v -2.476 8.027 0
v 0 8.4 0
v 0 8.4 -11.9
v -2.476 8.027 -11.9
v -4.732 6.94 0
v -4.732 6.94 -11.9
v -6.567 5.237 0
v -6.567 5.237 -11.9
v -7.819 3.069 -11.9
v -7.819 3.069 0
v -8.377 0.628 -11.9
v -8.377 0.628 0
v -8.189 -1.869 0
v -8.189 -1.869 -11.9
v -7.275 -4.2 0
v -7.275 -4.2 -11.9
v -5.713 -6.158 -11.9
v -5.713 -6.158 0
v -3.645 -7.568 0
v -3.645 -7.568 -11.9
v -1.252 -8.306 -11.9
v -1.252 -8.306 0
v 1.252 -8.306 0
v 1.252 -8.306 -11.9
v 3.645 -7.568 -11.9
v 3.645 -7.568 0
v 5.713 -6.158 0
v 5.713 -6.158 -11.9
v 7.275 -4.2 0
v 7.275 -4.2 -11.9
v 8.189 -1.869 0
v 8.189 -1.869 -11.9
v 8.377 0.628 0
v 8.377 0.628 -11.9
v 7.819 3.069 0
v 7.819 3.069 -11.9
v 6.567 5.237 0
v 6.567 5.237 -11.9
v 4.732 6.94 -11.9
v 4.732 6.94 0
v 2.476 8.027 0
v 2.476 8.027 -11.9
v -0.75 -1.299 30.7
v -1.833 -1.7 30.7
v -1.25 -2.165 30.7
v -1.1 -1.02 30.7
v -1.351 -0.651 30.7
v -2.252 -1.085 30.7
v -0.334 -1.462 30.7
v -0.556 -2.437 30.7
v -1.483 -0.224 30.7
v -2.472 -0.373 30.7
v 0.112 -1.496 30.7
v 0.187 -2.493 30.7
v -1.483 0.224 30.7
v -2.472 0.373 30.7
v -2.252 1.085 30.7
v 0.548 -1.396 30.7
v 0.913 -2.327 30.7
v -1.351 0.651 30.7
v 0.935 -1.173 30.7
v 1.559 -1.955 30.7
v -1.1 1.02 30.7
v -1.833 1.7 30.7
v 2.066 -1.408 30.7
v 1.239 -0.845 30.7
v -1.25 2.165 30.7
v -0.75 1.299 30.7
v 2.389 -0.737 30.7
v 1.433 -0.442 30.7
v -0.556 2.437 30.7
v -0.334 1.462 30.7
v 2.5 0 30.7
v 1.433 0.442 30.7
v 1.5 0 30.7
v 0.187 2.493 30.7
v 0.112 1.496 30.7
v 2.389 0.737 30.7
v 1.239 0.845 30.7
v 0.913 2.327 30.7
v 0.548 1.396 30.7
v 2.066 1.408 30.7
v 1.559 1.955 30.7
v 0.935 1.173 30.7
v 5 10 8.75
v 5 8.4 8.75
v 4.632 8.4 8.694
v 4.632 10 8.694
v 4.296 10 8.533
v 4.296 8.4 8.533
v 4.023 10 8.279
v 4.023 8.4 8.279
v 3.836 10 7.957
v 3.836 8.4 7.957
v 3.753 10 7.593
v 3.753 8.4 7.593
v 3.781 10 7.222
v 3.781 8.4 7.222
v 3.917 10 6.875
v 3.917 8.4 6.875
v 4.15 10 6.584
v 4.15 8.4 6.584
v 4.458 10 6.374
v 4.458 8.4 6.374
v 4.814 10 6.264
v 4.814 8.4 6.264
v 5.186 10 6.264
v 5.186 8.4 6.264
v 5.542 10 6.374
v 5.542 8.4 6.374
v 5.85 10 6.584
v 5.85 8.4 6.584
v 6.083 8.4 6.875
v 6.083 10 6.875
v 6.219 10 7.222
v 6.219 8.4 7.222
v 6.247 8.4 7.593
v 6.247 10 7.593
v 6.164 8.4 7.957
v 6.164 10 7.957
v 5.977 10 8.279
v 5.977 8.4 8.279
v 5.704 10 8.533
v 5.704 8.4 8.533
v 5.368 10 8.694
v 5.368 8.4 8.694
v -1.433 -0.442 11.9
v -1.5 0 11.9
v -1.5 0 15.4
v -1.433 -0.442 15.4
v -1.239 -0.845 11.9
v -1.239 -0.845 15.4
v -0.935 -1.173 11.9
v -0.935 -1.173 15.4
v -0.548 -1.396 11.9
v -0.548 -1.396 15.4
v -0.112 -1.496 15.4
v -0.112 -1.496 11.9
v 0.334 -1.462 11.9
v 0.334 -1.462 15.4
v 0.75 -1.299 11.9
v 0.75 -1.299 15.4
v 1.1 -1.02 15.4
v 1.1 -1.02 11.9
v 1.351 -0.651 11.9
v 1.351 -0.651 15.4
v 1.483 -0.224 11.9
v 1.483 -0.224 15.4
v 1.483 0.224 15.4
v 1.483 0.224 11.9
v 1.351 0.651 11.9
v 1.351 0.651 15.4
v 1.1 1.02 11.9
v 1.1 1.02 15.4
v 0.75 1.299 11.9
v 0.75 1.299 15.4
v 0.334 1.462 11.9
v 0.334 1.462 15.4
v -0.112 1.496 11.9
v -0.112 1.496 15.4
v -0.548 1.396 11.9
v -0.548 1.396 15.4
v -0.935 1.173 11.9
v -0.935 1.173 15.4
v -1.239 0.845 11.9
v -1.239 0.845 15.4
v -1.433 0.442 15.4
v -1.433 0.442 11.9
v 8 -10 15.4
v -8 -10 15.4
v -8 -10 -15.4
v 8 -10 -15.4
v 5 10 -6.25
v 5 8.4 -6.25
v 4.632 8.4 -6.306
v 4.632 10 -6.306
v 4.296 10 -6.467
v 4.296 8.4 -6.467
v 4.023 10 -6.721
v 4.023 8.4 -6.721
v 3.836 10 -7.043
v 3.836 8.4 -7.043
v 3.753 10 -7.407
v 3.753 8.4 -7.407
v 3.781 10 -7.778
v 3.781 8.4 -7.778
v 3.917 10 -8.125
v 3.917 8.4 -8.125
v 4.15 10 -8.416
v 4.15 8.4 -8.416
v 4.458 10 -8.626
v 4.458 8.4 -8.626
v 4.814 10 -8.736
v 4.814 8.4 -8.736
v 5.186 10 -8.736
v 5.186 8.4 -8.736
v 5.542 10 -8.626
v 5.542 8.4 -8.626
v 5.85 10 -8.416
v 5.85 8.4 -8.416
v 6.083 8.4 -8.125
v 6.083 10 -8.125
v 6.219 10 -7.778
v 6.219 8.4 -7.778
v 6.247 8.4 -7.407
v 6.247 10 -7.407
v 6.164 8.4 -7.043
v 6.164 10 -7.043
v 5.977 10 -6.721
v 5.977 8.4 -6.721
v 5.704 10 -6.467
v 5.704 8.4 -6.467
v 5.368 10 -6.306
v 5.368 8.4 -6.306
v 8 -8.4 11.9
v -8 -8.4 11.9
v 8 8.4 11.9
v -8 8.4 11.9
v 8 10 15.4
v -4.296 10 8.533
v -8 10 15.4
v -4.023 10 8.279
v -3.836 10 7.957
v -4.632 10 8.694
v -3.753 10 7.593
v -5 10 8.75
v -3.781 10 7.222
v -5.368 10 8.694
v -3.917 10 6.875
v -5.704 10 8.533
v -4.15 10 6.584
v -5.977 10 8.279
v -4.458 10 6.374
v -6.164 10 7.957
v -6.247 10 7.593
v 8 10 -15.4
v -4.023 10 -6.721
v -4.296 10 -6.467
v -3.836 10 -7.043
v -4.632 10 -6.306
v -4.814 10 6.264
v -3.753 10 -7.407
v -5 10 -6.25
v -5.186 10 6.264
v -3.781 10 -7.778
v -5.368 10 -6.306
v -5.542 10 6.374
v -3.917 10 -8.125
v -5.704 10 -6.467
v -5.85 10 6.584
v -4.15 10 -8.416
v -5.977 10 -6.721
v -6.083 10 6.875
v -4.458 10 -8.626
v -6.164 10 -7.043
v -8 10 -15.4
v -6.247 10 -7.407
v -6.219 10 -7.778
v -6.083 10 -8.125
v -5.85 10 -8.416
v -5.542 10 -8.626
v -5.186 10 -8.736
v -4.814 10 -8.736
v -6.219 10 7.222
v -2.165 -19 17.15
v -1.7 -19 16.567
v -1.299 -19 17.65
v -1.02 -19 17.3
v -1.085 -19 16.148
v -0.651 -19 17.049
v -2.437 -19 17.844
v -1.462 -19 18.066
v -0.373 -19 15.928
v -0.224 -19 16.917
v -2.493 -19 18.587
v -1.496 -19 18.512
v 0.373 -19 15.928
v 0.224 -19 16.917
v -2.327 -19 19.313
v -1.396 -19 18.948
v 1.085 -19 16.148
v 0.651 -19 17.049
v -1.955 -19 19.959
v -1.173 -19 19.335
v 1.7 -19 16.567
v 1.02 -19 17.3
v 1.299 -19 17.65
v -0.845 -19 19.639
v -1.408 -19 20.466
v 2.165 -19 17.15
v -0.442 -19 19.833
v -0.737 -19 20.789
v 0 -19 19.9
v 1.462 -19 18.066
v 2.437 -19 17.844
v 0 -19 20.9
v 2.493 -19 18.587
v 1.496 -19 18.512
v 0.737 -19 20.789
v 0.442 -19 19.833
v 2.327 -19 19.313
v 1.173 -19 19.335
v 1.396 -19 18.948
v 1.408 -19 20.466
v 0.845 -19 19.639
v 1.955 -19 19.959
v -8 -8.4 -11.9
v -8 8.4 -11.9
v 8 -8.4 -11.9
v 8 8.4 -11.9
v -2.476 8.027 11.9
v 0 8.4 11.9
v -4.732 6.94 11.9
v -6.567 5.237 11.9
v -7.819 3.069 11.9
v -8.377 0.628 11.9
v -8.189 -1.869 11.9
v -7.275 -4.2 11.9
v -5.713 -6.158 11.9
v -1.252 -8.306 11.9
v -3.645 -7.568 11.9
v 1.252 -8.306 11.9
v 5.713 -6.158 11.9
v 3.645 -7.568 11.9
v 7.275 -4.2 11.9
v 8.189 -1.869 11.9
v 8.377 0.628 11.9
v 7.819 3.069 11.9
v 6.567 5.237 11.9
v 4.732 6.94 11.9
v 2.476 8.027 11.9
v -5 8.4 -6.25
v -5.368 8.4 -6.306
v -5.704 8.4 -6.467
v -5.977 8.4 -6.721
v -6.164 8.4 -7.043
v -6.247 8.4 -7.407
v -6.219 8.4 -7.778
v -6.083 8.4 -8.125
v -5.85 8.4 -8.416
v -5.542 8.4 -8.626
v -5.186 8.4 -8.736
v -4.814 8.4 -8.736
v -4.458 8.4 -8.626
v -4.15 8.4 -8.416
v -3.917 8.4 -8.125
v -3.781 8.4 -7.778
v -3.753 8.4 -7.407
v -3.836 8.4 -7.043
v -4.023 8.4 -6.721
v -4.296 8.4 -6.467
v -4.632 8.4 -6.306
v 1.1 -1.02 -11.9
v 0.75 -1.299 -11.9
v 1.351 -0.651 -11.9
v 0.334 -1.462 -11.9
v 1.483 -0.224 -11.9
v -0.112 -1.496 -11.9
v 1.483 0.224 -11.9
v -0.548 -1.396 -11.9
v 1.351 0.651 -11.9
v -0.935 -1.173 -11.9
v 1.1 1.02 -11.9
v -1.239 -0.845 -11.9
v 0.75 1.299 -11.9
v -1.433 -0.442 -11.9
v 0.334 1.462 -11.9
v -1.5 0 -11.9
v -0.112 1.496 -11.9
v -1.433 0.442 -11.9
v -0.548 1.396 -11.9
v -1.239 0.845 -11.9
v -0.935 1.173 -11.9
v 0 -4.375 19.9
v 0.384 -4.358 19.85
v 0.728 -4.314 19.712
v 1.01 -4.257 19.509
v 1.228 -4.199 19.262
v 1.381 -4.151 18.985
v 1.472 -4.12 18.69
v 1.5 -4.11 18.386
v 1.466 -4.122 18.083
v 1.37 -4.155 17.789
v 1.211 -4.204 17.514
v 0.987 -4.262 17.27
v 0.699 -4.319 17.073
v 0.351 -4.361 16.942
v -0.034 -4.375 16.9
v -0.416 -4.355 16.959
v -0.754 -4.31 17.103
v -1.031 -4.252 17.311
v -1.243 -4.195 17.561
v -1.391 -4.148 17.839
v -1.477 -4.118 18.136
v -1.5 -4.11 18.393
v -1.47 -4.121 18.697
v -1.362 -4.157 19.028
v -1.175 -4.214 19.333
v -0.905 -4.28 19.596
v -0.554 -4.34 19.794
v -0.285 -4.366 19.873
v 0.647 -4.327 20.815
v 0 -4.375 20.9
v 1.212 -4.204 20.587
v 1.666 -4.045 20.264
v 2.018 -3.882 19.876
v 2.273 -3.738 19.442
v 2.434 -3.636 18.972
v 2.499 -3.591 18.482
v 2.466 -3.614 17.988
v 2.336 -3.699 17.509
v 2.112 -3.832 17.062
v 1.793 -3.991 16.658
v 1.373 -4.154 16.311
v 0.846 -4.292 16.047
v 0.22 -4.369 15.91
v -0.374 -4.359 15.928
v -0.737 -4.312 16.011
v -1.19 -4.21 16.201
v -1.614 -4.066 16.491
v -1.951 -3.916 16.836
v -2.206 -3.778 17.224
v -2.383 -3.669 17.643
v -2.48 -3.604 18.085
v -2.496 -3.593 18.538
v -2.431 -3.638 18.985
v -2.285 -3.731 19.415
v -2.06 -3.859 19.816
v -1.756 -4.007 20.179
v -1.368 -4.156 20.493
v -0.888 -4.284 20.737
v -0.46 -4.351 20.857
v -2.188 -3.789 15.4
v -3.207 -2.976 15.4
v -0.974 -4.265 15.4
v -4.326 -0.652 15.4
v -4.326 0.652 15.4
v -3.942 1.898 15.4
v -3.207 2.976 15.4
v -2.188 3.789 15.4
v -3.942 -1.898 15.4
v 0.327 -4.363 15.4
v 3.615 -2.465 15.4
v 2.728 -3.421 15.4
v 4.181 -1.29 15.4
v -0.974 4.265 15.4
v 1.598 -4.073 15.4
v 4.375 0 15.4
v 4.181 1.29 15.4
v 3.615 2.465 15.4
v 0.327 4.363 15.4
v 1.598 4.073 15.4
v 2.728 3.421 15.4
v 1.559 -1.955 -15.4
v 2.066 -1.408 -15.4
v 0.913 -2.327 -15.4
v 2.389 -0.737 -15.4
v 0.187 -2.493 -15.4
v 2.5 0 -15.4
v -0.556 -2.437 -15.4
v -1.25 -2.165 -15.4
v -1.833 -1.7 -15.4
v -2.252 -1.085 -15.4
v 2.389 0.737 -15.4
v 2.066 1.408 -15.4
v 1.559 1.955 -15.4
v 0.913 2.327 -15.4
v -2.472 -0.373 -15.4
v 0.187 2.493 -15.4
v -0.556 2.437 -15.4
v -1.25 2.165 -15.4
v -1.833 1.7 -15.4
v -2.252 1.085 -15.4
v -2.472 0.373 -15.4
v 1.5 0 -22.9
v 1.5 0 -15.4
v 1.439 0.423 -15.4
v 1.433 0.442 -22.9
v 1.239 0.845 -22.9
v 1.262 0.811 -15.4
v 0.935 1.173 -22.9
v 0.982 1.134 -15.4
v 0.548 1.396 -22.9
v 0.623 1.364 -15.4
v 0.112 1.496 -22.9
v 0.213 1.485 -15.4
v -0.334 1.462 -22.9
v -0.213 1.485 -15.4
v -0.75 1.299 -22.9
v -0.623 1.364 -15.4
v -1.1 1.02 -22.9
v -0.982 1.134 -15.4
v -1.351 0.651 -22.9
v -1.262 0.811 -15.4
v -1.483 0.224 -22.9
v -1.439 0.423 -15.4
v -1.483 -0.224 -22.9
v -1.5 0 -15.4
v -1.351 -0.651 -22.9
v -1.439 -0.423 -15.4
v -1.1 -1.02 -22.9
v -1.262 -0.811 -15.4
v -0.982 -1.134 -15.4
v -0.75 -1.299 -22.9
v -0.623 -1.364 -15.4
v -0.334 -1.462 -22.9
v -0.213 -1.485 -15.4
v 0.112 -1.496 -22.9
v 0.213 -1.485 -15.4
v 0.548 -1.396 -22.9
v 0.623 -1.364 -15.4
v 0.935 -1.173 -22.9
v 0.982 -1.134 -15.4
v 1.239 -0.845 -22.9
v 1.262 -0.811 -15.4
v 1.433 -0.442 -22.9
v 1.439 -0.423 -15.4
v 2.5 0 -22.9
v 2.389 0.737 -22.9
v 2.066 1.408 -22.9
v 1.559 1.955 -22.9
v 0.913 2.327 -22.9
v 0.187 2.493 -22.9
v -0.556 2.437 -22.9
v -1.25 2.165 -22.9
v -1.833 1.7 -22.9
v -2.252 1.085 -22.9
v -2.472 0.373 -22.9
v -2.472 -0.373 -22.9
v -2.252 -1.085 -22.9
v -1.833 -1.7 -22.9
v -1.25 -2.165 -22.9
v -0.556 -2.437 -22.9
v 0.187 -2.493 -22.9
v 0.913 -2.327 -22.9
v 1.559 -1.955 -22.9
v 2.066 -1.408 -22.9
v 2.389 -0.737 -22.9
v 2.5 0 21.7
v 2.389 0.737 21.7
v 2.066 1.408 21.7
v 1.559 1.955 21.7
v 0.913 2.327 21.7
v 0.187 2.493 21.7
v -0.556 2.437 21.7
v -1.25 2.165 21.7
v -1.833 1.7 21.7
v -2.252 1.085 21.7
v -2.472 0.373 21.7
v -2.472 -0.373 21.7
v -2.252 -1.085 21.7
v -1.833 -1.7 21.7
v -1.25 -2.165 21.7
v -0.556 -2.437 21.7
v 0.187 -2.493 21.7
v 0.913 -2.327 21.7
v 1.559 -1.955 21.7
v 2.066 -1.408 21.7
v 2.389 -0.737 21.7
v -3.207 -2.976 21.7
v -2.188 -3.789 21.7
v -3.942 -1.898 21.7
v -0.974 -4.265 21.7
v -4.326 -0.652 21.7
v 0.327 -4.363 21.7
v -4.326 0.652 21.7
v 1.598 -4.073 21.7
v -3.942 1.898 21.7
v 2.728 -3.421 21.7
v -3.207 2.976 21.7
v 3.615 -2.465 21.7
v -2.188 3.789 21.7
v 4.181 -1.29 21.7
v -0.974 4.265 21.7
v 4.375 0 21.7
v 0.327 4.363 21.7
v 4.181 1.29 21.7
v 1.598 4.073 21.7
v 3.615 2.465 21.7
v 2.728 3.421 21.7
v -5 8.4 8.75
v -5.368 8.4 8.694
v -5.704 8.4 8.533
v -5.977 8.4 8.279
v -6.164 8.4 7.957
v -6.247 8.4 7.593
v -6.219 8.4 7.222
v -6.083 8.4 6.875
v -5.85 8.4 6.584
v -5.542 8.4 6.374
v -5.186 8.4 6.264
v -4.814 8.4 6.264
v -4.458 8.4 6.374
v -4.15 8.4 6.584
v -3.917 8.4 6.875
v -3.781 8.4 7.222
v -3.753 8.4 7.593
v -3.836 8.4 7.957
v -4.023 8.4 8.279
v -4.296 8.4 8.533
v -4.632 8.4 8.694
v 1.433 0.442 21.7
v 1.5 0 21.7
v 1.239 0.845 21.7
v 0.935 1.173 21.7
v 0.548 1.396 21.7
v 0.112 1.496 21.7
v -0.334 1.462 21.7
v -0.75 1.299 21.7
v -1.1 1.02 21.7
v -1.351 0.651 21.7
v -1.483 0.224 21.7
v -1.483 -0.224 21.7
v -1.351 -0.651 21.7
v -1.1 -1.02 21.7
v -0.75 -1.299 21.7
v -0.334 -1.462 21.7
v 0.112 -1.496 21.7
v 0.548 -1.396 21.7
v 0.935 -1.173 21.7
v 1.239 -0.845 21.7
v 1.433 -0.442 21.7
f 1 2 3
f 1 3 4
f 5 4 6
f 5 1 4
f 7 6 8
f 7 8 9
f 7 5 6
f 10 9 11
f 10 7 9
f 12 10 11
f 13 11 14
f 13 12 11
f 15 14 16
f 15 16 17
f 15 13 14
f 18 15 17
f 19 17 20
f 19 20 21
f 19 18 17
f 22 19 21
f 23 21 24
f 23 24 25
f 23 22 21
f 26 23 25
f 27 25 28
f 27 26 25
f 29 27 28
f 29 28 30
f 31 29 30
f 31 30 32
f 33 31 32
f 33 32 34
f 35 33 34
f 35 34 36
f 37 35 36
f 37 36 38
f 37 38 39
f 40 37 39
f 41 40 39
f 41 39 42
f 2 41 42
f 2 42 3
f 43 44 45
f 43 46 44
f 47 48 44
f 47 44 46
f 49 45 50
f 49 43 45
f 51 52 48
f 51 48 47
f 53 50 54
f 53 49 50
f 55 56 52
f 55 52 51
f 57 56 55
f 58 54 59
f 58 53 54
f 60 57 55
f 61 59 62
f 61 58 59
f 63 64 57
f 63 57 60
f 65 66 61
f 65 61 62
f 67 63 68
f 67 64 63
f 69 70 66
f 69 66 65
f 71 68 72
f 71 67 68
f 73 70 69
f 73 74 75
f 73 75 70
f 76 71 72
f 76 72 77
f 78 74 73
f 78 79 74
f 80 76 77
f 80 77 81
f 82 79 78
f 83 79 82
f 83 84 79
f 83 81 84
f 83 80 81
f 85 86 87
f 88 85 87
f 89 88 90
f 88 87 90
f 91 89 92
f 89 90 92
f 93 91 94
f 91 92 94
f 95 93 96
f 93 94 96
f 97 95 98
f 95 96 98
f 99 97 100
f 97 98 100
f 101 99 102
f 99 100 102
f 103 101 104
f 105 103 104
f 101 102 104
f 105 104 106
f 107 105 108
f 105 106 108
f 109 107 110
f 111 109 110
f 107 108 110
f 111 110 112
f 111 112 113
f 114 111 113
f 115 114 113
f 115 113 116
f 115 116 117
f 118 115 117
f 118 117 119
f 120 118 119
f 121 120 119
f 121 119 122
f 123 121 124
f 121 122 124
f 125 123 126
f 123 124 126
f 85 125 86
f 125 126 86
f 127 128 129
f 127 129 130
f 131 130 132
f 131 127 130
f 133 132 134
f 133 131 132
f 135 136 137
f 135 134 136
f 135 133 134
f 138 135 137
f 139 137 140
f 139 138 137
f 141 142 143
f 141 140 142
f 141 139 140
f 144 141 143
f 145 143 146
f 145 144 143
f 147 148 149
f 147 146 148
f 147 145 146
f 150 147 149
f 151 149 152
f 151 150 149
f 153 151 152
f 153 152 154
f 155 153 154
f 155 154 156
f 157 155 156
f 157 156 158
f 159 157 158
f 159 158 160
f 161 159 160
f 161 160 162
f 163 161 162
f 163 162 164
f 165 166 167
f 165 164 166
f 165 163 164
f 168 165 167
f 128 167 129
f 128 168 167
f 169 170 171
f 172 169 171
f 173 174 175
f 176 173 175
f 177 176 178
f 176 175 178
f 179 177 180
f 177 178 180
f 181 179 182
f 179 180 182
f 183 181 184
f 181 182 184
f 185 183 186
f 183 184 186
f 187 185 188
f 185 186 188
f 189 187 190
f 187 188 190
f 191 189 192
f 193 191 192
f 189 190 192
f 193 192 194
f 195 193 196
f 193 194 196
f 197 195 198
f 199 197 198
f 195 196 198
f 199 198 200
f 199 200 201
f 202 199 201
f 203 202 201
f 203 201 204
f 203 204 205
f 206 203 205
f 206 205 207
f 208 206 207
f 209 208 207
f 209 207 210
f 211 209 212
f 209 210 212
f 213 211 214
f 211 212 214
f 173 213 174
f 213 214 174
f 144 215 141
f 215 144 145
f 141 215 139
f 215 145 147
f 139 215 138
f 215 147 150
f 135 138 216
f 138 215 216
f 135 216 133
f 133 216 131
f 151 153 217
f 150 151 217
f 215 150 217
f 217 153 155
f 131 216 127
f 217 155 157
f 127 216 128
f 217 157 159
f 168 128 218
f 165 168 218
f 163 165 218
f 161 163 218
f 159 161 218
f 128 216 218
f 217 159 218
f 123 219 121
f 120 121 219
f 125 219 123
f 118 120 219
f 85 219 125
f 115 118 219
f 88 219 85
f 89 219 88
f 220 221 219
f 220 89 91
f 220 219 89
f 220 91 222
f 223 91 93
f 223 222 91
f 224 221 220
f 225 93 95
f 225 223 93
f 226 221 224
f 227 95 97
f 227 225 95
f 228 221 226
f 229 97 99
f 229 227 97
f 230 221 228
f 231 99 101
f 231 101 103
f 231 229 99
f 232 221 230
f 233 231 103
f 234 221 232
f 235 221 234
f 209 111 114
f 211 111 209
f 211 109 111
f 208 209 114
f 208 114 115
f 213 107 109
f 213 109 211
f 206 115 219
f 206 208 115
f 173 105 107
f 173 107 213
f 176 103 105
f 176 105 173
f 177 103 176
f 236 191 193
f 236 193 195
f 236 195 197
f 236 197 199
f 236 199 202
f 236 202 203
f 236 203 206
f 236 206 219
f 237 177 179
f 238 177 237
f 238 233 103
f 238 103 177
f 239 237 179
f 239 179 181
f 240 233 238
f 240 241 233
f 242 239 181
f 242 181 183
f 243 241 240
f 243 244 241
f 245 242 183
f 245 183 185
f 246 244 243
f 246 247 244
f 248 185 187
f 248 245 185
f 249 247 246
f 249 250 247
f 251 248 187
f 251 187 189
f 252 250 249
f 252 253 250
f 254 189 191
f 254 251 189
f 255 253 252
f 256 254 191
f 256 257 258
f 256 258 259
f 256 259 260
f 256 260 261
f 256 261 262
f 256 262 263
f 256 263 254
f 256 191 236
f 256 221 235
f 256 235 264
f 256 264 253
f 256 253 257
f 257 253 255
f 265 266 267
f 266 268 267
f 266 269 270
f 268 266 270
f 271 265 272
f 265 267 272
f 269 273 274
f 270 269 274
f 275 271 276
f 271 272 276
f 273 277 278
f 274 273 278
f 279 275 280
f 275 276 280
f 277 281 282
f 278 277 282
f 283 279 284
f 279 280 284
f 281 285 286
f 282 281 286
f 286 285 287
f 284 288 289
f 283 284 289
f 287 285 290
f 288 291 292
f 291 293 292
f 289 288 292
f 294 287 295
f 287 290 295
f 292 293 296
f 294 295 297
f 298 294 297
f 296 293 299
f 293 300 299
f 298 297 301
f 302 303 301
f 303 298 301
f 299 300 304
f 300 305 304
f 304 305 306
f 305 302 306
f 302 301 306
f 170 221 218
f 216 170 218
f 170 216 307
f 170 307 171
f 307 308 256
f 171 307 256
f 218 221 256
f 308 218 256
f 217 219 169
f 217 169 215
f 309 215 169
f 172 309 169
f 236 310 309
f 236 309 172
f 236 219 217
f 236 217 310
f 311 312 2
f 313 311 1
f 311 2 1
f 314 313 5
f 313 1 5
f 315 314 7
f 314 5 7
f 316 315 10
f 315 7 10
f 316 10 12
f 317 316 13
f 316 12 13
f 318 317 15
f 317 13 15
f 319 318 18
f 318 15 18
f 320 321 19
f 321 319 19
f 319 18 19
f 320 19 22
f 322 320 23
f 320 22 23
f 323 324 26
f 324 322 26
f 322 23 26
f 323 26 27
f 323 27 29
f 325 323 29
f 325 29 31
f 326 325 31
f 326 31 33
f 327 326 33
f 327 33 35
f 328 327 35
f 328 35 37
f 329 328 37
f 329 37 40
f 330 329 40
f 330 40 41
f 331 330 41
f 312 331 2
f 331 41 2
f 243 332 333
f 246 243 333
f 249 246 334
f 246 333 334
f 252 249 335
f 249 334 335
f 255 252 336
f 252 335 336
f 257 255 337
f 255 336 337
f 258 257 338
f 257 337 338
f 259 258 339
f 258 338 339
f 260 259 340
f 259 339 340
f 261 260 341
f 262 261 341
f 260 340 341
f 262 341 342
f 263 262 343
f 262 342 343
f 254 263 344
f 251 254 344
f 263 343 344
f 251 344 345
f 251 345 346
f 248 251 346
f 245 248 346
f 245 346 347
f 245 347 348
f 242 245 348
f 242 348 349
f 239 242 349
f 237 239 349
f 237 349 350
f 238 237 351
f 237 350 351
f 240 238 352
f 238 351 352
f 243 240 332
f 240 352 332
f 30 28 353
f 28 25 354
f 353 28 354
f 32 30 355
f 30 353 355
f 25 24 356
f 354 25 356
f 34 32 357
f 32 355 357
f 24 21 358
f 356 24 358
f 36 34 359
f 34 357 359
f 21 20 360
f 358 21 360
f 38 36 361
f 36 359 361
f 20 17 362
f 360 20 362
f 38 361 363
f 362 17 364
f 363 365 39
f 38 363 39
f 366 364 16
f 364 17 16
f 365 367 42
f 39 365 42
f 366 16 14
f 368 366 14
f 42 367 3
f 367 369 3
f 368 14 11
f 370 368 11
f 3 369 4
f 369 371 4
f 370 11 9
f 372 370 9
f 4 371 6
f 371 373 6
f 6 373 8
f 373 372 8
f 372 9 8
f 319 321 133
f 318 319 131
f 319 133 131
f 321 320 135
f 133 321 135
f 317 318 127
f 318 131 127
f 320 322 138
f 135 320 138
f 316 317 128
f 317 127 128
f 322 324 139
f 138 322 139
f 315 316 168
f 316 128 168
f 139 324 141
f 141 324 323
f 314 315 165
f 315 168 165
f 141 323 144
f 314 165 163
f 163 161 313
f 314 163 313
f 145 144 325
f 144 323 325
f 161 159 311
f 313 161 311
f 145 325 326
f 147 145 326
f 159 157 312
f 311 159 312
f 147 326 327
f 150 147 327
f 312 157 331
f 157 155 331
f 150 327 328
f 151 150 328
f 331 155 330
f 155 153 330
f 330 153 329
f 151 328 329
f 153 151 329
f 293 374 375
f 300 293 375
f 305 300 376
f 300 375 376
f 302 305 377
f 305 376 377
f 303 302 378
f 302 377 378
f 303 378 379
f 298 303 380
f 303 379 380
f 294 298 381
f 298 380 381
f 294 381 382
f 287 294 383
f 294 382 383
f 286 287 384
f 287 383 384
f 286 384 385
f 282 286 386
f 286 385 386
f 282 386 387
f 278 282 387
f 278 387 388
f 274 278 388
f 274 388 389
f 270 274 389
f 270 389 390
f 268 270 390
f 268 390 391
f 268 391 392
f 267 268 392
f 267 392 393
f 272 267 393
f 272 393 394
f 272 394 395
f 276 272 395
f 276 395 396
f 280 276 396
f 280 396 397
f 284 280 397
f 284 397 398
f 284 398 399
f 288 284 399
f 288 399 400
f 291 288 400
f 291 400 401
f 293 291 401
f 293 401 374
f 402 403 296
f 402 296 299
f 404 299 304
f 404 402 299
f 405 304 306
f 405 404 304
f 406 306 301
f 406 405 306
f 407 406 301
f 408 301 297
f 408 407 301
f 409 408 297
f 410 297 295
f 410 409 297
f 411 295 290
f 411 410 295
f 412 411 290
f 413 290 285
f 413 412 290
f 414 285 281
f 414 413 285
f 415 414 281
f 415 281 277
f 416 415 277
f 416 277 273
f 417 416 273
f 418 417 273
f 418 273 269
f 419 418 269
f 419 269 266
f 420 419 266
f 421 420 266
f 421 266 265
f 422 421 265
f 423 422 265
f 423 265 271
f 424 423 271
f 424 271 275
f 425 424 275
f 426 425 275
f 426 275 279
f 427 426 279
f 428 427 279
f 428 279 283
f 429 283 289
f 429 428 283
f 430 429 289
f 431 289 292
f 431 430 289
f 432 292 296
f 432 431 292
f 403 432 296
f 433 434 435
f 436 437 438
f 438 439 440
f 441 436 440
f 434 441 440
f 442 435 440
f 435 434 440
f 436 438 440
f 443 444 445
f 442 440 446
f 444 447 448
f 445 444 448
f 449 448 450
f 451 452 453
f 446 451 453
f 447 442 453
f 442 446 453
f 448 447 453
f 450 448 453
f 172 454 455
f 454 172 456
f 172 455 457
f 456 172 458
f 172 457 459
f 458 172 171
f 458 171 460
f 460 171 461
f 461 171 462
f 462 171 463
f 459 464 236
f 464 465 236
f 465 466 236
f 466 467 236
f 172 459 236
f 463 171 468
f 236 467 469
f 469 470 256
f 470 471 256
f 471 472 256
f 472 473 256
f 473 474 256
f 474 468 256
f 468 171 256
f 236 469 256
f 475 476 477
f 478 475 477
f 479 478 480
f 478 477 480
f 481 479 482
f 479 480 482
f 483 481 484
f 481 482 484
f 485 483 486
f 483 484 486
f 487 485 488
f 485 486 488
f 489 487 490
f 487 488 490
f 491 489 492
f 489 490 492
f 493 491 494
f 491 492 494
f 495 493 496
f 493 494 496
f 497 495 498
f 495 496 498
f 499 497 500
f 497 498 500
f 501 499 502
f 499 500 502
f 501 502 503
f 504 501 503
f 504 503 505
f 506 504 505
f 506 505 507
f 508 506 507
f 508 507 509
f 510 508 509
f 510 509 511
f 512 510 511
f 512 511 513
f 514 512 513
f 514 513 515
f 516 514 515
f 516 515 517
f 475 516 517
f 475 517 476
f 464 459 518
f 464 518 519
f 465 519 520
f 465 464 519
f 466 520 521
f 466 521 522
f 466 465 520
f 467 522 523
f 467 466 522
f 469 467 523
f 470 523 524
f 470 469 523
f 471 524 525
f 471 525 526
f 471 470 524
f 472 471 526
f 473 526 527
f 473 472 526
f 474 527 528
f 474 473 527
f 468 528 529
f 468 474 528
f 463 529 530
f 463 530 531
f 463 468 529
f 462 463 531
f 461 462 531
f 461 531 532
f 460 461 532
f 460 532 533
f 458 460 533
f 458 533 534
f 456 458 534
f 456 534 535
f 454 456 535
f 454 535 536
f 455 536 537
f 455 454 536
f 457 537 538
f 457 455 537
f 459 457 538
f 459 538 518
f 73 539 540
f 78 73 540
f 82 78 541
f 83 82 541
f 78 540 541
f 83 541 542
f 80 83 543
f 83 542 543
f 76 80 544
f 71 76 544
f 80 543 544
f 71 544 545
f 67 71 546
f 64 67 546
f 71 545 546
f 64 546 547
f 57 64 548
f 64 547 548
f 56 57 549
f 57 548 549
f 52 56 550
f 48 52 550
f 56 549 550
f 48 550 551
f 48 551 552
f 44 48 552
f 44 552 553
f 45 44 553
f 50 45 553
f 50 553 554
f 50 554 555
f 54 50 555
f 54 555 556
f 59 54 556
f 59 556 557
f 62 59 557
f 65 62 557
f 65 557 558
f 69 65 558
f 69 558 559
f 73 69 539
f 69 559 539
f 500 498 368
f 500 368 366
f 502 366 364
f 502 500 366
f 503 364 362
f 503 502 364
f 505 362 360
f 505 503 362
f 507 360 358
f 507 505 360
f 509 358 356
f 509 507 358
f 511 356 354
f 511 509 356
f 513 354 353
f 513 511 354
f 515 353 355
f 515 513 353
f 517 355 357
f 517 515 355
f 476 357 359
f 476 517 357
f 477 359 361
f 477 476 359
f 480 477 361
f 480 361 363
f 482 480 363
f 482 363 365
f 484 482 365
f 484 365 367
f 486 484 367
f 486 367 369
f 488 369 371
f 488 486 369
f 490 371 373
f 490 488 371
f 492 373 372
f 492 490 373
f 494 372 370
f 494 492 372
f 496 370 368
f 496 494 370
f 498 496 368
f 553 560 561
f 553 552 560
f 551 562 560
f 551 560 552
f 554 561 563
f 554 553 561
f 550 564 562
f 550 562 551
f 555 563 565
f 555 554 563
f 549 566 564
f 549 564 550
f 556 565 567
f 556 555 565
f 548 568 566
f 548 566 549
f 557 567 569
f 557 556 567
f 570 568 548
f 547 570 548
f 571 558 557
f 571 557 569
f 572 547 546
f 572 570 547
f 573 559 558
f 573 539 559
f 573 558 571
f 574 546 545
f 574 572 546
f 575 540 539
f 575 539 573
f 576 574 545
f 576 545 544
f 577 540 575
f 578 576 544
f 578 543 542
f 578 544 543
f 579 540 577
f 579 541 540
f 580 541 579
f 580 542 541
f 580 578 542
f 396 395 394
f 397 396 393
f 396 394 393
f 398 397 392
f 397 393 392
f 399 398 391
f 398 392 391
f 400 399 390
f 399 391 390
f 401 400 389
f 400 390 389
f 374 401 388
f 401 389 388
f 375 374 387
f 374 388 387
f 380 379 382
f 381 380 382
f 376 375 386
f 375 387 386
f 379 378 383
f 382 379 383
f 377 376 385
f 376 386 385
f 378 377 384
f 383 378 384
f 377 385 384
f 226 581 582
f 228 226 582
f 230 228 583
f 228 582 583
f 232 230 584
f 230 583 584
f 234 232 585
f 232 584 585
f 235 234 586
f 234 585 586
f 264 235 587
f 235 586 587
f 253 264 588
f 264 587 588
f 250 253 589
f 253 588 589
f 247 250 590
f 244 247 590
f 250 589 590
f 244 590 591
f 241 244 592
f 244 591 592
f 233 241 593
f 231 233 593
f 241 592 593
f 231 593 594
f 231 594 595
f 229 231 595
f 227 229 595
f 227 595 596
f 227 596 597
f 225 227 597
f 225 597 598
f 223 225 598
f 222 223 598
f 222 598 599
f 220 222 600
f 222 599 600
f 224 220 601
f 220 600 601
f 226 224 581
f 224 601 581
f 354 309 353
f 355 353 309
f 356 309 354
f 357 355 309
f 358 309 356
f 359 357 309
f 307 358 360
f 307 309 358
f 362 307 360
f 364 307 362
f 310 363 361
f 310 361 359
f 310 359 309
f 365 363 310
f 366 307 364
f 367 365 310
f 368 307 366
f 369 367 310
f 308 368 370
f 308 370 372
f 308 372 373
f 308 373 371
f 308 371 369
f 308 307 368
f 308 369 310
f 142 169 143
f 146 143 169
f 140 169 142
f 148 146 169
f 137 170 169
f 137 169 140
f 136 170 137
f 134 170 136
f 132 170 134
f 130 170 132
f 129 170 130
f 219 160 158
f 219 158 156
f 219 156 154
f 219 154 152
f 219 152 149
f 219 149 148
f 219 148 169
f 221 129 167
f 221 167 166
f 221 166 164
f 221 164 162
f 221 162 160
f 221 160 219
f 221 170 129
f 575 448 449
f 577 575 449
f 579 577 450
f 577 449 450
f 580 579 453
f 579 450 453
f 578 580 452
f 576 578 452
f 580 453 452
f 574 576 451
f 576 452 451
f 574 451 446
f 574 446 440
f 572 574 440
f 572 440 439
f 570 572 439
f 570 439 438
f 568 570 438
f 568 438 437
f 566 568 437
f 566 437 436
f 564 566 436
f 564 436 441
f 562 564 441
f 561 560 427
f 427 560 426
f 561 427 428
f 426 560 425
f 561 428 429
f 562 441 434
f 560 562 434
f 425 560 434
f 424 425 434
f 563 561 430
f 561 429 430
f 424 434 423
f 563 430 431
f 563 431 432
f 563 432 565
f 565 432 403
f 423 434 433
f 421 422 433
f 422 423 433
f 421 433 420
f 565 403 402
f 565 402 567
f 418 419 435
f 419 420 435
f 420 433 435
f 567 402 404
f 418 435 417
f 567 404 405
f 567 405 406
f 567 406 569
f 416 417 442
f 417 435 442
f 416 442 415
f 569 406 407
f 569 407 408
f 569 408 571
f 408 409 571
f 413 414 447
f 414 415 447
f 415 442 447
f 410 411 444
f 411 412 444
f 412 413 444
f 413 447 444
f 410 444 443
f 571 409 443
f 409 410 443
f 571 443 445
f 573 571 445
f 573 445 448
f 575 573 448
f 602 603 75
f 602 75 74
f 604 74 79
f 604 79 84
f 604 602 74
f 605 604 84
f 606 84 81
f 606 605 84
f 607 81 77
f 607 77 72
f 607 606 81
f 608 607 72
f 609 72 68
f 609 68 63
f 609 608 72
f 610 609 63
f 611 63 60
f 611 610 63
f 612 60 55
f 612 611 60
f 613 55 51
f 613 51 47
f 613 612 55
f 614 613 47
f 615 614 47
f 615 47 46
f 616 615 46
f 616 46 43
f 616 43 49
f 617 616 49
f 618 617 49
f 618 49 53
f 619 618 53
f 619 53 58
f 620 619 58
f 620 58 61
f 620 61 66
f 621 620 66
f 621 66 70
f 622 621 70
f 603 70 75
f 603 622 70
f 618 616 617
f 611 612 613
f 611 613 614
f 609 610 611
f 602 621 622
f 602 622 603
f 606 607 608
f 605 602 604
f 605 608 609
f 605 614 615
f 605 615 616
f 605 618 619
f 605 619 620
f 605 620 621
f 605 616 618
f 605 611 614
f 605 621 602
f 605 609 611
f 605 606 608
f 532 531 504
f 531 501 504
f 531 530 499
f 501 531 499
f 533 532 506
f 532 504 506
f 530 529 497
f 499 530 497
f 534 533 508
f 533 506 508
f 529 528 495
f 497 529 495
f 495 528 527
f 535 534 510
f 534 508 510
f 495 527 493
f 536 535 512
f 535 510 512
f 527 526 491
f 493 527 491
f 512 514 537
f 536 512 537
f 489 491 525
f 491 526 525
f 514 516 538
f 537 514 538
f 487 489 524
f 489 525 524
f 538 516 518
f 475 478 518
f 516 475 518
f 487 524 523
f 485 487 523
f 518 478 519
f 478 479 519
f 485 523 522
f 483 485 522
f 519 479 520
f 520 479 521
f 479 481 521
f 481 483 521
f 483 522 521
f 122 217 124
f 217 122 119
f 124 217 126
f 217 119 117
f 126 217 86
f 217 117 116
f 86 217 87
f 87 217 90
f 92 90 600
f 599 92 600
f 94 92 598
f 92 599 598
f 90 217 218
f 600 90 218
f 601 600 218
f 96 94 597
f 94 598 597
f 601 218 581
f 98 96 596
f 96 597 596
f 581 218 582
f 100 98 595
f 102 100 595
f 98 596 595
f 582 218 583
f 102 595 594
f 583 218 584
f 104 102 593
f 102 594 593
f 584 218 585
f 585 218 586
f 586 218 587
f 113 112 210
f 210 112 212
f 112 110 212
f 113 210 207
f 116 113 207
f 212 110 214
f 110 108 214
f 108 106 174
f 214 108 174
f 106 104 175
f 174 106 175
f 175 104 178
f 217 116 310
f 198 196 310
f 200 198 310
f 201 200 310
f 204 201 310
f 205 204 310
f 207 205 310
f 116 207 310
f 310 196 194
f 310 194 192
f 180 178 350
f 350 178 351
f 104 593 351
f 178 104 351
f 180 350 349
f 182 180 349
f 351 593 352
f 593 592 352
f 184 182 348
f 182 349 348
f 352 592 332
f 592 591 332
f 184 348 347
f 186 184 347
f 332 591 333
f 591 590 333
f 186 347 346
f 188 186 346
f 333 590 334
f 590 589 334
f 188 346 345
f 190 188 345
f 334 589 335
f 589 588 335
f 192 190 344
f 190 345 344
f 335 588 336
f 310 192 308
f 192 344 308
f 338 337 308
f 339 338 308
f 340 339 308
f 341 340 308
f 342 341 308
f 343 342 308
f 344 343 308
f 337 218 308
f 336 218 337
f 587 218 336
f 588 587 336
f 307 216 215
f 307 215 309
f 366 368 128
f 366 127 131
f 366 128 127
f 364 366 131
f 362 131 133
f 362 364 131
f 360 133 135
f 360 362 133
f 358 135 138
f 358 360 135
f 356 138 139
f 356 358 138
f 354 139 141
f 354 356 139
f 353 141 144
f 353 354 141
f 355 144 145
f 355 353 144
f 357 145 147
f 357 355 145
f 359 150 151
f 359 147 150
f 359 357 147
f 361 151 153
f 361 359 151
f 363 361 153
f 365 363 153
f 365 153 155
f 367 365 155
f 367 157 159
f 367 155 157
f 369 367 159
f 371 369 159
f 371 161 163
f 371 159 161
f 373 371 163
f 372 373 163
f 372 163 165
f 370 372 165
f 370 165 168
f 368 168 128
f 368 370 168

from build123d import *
from build123d.topology import SkipClean

# Parameters (mm, degrees)
FRAME_EXTRUDE_DEPTH                     = 8
FRAME_EXTRUDE_DEPTH_BACK                = 8
FRAME_SKETCH_W                          = 30.8
FRAME_SKETCH_H                          = 20
FRAME_SKETCH_W_2                        = 23.8
FRAME_SKETCH_H_2                        = 16.8
ELECTROMAGNET_EXTRUDE_REACH             = 22.029
ELECTROMAGNET_SKETCH_R                  = 8.4
ELECTROMAGNET_EXTRUDE_DIRECTION_2_REACH = 22.029
PORT_3_SKETCH_R                         = 2.5
PORT_3_SKETCH_R_2                       = 1.5
PORT_3_EXTRUDE_DEPTH                    = 7.5
PORT_3_SKETCH_3_R                       = 1.5
CENTER_HOLE_CUT_DEPTH                   = 34.45444664
BASE_OF_PORTS_1_2_SKETCH_R              = 4.375
BASE_OF_PORT_1_2_PORTS_DEPTH            = 6.3
PORT_2_SKETCH_R                         = 2.5
PORT_2_SKETCH_R_2                       = 1.5
PORT_2_EXTRUDE_DEPTH                    = 9
PORTS_1_SKETCH_R                        = 2.5
PORTS_1_SKETCH_R_2                      = 1.5
PORTS_1_EXTRUDE_DEPTH                   = 19
MOUNTING_HOLES_PROFILE_SKETCH_W         = 1.25
MOUNTING_HOLES_PROFILE_SKETCH_H         = 3.250185188
MOUNTING_HOLES_AT_2_COUNT               = 2
MOUNTING_HOLES_AT_2_PITCH               = 18.027756377
MOUNTING_HOLES_AT_3_COUNT               = 2
MOUNTING_HOLES_AT_3_PITCH               = 15
MOUNTING_HOLES_AT_4_COUNT               = 2
MOUNTING_HOLES_AT_4_PITCH               = 10


with BuildPart() as part:
    # Frame Sketch → Frame Extrude (new, two sides: drawn at the far end of the back side and taken through both)
    with BuildSketch(Plane(origin=(0, 0, 0), x_dir=(0, 0, -1), z_dir=(1, 0, 0)).offset(-FRAME_EXTRUDE_DEPTH_BACK)):
        Rectangle(FRAME_SKETCH_W, FRAME_SKETCH_H)
        Rectangle(FRAME_SKETCH_W_2, FRAME_SKETCH_H_2, mode=Mode.SUBTRACT)
    extrude(amount=FRAME_EXTRUDE_DEPTH + FRAME_EXTRUDE_DEPTH_BACK)


with BuildPart() as body_2:

    # Electromagnet Extrude: up to this face of the body (flat: up to its plane)
    electromagnet_extrude_end = Plane(part.part.faces().sort_by_distance((0, 0, 11.9))[0])
    # Electromagnet Sketch → Electromagnet Extrude (new, up to the picked face)
    with BuildSketch(Plane.XY, mode=Mode.PRIVATE) as electromagnet_extrude_sk1:
        with Locations(Location((0, 0, 0), (0, 0, 90))):
            Circle(ELECTROMAGNET_SKETCH_R)
    electromagnet_extrude_tool1 = split(extrude(electromagnet_extrude_sk1.sketch, amount=ELECTROMAGNET_EXTRUDE_REACH, mode=Mode.PRIVATE), bisect_by=electromagnet_extrude_end, keep=Keep.BOTH, mode=Mode.PRIVATE)
    add(electromagnet_extrude_tool1.solids().sort_by(Axis((0, 0, 0), (0, 0, 1)))[0])


    # Electromagnet Extrude direction 2: up to this face of the body (flat: up to its plane)
    electromagnet_extrude_direction_2_end = Plane(part.part.faces().sort_by_distance((0, 0, -11.9))[0])
    # Electromagnet Sketch → Electromagnet Extrude direction 2 (add, up to the picked face)
    with BuildSketch(Plane.XY, mode=Mode.PRIVATE) as electromagnet_extrude_direction_2_sk1:
        with Locations(Location((0, 0, 0), (0, 0, 90))):
            Circle(ELECTROMAGNET_SKETCH_R)
    electromagnet_extrude_direction_2_tool1 = split(extrude(electromagnet_extrude_direction_2_sk1.sketch, amount=-ELECTROMAGNET_EXTRUDE_DIRECTION_2_REACH, mode=Mode.PRIVATE), bisect_by=electromagnet_extrude_direction_2_end, keep=Keep.BOTH, mode=Mode.PRIVATE)
    add(electromagnet_extrude_direction_2_tool1.solids().sort_by(Axis((0, 0, 0), (0, 0, -1)))[0])


with BuildPart() as part_1:
    add(part.part)

    # Port 3 Sketch → Port 3 Extrude (add)
    with BuildSketch(Plane.XY.offset(-15.4)):
        Circle(PORT_3_SKETCH_R)
        Circle(PORT_3_SKETCH_R_2, mode=Mode.SUBTRACT)
    extrude(amount=-PORT_3_EXTRUDE_DEPTH)


with BuildPart() as center_hole_cut_tool:
    # Port 3 Sketch<3> → Center Hole Cut (new, through all)
    with SkipClean():  # the faces are left unmerged after this step: merging them gives an invalid solid
        with BuildSketch(Plane.XY.offset(-15.4)):
            with Locations(Location((0, 0, 0), (0, 0, 180))):
                Circle(PORT_3_SKETCH_3_R)
        extrude(amount=CENTER_HOLE_CUT_DEPTH)


with BuildPart() as part_2:
    with SkipClean():  # the faces are left unmerged after this step: merging them gives an invalid solid
        add(part_1.part)

        # Center Hole Cut: cut by center_hole_cut_tool
        add(center_hole_cut_tool.part, mode=Mode.SUBTRACT)

    # Mounting Holes Profile Sketch → Mounting Holes (revolve, cut)
    with SkipClean():  # the faces are left unmerged after this step: merging them gives an invalid solid
        with BuildSketch(Plane(origin=(5, 10, 7.5), x_dir=(0, 0, 1), z_dir=(1, 0, 0))):
            with Locations((0.625, 1.625092594)):
                Rectangle(MOUNTING_HOLES_PROFILE_SKETCH_W, MOUNTING_HOLES_PROFILE_SKETCH_H)
        mounting_holes = revolve(axis=Axis((5, 16.35, 7.5), (0, -1, 0)), mode=Mode.SUBTRACT)

    # Mounting Holes at 2: Mounting Holes ×2
    with SkipClean():  # the faces are left unmerged after this step: merging them gives an invalid solid
        with Locations(*[Vector(-0.5547001962252294, 0, -0.8320502943378435) * (i * MOUNTING_HOLES_AT_2_PITCH) for i in range(1, MOUNTING_HOLES_AT_2_COUNT)]):
            add(mounting_holes, mode=Mode.SUBTRACT)

    # Mounting Holes at 3: Mounting Holes ×2
    with SkipClean():  # the faces are left unmerged after this step: merging them gives an invalid solid
        with Locations(*[(0, 0, -i * MOUNTING_HOLES_AT_3_PITCH) for i in range(1, MOUNTING_HOLES_AT_3_COUNT)]):
            add(mounting_holes, mode=Mode.SUBTRACT)

    # Mounting Holes at 4: Mounting Holes ×2
    with SkipClean():  # the faces are left unmerged after this step: merging them gives an invalid solid
        with Locations(*[(-i * MOUNTING_HOLES_AT_4_PITCH, 0, 0) for i in range(1, MOUNTING_HOLES_AT_4_COUNT)]):
            add(mounting_holes, mode=Mode.SUBTRACT)


with BuildPart() as body_2_1:
    with SkipClean():  # the faces are left unmerged after this step: merging them gives an invalid solid
        add(body_2.part)

        # Center Hole Cut: cut by center_hole_cut_tool
        add(center_hole_cut_tool.part, mode=Mode.SUBTRACT)


with BuildPart() as body_3:
    # Base of Ports 1&2 Sketch → Base of Port 1&2 Ports (new body)
    with BuildSketch(Plane.XY.offset(15.4)):
        Circle(BASE_OF_PORTS_1_2_SKETCH_R)
    extrude(amount=BASE_OF_PORT_1_2_PORTS_DEPTH)

    # Port 2 Sketch → Port 2 Extrude (add)
    with BuildSketch(Plane.XY.offset(21.7)):
        Circle(PORT_2_SKETCH_R)
        Circle(PORT_2_SKETCH_R_2, mode=Mode.SUBTRACT)
    extrude(amount=PORT_2_EXTRUDE_DEPTH)

    # Ports 1 Sketch → Ports 1 Extrude (add)
    with BuildSketch(Plane(origin=(2.609545443, 0, 0), x_dir=(0, 0, -1), z_dir=(0, 1, 0))):
        with Locations(Location((-18.4, 2.609545443, 0), (0, 0, 180))):
            Circle(PORTS_1_SKETCH_R)
        with Locations(Location((-18.4, 2.609545443, 0), (0, 0, 180))):
            Circle(PORTS_1_SKETCH_R_2, mode=Mode.SUBTRACT)
    extrude(amount=-PORTS_1_EXTRUDE_DEPTH)


solid = Compound([part_2.part, body_2_1.part, body_3.part])
